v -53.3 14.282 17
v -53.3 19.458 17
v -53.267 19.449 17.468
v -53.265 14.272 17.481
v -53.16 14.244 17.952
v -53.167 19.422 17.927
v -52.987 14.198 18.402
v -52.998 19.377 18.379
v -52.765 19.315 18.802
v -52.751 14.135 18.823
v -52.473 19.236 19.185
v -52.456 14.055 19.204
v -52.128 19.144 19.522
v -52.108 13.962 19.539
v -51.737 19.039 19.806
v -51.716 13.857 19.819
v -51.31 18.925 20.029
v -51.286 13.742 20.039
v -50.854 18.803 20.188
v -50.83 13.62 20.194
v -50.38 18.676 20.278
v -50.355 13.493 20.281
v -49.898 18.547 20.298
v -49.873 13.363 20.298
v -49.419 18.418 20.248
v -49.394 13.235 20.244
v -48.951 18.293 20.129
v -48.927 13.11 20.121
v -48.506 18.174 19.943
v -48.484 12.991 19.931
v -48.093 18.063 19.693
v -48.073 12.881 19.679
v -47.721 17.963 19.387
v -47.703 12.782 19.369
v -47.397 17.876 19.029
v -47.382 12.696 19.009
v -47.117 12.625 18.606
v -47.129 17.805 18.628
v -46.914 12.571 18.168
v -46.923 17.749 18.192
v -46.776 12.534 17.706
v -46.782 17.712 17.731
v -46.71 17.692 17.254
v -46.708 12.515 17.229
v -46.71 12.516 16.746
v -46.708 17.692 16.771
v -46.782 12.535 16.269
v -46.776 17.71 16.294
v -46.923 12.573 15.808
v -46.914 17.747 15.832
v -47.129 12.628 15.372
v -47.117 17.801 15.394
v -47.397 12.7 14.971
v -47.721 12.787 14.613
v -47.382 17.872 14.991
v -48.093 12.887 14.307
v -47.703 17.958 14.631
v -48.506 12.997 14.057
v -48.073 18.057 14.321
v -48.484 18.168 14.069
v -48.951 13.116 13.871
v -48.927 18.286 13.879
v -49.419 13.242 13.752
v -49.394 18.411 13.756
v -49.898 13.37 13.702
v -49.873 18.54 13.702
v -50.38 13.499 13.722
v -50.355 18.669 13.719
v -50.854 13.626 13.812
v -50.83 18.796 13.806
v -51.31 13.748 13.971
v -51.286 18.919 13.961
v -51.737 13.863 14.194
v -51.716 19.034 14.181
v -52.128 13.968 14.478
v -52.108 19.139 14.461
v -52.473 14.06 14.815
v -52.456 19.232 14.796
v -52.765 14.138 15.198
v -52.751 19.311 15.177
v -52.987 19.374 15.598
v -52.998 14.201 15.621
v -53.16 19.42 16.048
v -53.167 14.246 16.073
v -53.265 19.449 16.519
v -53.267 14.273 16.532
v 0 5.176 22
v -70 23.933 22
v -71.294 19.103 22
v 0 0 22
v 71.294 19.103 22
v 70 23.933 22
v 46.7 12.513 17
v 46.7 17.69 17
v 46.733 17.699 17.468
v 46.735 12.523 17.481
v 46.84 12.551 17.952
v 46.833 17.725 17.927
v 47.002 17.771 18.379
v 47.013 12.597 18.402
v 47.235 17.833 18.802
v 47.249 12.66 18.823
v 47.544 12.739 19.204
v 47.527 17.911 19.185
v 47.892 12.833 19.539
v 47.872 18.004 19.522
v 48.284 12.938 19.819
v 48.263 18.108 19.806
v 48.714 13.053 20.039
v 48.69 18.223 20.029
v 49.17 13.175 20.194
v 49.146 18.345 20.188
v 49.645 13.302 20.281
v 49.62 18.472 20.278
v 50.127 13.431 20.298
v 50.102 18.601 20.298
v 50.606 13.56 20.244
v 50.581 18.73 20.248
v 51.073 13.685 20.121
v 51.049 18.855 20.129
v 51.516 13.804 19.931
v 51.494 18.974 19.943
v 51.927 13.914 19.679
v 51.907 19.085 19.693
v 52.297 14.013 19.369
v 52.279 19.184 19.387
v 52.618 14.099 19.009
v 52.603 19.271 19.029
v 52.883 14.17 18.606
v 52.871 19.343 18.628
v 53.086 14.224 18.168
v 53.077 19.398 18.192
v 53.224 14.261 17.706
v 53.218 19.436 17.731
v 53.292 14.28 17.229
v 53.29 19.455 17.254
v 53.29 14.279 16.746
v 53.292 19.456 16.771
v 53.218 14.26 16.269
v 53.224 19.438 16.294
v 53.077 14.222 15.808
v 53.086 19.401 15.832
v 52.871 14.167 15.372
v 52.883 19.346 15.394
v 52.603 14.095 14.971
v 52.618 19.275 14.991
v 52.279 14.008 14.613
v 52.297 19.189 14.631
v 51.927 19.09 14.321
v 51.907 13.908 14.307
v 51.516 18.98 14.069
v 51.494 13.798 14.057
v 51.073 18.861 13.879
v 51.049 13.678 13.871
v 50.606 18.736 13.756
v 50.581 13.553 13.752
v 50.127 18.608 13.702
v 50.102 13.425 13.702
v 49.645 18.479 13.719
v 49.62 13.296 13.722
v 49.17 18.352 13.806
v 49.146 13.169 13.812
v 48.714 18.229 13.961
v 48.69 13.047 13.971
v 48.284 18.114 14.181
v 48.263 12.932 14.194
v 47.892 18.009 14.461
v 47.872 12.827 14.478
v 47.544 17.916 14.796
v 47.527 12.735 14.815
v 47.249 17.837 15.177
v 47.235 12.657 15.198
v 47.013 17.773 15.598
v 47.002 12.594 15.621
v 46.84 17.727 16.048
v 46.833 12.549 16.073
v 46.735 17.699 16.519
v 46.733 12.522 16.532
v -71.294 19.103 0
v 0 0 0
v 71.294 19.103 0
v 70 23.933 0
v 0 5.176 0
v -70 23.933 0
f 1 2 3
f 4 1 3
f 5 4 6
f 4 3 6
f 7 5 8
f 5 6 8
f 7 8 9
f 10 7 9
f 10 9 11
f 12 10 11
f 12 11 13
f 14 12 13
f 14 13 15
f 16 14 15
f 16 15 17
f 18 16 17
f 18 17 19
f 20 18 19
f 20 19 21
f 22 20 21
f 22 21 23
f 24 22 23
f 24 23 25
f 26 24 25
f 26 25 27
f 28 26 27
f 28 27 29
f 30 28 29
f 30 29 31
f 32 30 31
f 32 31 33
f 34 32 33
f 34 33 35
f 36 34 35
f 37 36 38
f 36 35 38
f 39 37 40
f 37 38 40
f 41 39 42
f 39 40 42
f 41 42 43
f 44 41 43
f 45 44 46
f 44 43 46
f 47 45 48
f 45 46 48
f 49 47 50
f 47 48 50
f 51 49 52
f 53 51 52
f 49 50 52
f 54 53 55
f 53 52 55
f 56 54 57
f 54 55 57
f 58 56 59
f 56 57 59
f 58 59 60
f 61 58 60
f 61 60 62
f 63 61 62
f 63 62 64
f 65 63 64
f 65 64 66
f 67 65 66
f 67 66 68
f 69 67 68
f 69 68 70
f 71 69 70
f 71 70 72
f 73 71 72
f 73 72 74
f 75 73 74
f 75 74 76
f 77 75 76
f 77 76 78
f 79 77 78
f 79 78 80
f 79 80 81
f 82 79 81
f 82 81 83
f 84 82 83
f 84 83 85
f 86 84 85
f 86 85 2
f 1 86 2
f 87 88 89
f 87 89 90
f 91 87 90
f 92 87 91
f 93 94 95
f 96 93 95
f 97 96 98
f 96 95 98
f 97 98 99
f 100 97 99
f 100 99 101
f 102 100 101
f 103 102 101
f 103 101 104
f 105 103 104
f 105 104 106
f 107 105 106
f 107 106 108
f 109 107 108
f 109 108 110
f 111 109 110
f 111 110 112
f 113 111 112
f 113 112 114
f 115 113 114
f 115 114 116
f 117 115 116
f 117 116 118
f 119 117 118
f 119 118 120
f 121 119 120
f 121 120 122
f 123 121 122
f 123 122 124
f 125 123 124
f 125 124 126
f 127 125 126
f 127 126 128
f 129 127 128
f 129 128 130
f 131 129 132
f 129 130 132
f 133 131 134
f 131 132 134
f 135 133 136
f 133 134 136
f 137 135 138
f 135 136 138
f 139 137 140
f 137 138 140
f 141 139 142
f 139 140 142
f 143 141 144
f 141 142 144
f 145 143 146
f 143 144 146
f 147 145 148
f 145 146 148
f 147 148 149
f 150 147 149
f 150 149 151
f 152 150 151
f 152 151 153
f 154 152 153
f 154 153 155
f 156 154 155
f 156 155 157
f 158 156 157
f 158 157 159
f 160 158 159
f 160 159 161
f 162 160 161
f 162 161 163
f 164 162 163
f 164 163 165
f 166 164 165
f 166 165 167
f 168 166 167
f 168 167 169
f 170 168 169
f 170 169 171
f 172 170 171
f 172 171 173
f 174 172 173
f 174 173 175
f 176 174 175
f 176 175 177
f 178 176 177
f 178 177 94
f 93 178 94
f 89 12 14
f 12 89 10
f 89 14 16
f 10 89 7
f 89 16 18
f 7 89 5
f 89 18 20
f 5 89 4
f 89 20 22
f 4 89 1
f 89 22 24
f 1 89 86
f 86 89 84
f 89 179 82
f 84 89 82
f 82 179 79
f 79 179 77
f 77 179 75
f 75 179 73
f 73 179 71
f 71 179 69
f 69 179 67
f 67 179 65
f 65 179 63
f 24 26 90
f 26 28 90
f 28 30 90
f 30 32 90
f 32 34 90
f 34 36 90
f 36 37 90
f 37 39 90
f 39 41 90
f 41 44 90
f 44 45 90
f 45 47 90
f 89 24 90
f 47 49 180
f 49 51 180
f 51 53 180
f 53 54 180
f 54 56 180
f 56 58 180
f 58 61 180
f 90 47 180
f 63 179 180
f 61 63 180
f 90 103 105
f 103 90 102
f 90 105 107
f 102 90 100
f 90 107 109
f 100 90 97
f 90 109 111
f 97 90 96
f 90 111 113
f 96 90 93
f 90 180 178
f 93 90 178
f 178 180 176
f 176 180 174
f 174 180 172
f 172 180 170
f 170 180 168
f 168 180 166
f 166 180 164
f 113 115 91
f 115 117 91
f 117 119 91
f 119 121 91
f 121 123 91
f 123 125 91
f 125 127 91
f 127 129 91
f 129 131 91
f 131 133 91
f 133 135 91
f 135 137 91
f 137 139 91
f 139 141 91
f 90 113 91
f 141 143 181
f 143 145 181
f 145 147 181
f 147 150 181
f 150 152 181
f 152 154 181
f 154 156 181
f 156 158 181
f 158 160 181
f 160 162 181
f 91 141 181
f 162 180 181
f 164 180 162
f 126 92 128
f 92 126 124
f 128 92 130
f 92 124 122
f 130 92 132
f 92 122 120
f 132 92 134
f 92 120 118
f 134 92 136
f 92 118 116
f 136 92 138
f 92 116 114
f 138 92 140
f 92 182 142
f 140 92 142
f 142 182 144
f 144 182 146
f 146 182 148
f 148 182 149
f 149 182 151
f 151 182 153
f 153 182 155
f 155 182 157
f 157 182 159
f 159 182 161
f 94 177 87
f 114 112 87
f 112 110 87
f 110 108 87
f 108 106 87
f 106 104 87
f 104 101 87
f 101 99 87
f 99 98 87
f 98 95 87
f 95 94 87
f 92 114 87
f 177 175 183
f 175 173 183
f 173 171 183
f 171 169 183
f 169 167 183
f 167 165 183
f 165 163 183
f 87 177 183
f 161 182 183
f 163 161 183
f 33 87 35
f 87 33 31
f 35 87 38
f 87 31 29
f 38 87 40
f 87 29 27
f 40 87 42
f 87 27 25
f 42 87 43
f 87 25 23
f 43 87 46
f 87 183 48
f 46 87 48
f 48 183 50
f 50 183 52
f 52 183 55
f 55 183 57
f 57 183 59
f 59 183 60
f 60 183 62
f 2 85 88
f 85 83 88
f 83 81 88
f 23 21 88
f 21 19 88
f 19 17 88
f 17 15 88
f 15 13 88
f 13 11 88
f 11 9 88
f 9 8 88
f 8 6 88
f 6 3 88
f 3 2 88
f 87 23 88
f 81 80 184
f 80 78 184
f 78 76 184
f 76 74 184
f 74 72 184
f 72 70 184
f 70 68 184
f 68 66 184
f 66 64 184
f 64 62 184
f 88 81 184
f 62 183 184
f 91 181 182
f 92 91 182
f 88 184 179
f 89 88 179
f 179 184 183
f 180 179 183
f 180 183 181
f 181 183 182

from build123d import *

# Parameters (mm, degrees)
F1_DEPTH = 22
F3_D     = 6.6


with BuildPart() as f1:
    # F0 (on Top) → F1 (new body)
    with BuildSketch(Plane.XY):
        Polygon((-70, 23.9328243722), (-71.2940952255, 19.1031952408), (0, 0), (71.2940952255, 19.1031952408), (70, 23.9328243722), (0, 5.1763809021), align=None)
    extrude(amount=F1_DEPTH)

    # F3 (through all)
    with Locations(Plane.XZ):
        with Locations((-50, 17), (50, 17)):
            Hole(F3_D / 2)


solid = f1.part
